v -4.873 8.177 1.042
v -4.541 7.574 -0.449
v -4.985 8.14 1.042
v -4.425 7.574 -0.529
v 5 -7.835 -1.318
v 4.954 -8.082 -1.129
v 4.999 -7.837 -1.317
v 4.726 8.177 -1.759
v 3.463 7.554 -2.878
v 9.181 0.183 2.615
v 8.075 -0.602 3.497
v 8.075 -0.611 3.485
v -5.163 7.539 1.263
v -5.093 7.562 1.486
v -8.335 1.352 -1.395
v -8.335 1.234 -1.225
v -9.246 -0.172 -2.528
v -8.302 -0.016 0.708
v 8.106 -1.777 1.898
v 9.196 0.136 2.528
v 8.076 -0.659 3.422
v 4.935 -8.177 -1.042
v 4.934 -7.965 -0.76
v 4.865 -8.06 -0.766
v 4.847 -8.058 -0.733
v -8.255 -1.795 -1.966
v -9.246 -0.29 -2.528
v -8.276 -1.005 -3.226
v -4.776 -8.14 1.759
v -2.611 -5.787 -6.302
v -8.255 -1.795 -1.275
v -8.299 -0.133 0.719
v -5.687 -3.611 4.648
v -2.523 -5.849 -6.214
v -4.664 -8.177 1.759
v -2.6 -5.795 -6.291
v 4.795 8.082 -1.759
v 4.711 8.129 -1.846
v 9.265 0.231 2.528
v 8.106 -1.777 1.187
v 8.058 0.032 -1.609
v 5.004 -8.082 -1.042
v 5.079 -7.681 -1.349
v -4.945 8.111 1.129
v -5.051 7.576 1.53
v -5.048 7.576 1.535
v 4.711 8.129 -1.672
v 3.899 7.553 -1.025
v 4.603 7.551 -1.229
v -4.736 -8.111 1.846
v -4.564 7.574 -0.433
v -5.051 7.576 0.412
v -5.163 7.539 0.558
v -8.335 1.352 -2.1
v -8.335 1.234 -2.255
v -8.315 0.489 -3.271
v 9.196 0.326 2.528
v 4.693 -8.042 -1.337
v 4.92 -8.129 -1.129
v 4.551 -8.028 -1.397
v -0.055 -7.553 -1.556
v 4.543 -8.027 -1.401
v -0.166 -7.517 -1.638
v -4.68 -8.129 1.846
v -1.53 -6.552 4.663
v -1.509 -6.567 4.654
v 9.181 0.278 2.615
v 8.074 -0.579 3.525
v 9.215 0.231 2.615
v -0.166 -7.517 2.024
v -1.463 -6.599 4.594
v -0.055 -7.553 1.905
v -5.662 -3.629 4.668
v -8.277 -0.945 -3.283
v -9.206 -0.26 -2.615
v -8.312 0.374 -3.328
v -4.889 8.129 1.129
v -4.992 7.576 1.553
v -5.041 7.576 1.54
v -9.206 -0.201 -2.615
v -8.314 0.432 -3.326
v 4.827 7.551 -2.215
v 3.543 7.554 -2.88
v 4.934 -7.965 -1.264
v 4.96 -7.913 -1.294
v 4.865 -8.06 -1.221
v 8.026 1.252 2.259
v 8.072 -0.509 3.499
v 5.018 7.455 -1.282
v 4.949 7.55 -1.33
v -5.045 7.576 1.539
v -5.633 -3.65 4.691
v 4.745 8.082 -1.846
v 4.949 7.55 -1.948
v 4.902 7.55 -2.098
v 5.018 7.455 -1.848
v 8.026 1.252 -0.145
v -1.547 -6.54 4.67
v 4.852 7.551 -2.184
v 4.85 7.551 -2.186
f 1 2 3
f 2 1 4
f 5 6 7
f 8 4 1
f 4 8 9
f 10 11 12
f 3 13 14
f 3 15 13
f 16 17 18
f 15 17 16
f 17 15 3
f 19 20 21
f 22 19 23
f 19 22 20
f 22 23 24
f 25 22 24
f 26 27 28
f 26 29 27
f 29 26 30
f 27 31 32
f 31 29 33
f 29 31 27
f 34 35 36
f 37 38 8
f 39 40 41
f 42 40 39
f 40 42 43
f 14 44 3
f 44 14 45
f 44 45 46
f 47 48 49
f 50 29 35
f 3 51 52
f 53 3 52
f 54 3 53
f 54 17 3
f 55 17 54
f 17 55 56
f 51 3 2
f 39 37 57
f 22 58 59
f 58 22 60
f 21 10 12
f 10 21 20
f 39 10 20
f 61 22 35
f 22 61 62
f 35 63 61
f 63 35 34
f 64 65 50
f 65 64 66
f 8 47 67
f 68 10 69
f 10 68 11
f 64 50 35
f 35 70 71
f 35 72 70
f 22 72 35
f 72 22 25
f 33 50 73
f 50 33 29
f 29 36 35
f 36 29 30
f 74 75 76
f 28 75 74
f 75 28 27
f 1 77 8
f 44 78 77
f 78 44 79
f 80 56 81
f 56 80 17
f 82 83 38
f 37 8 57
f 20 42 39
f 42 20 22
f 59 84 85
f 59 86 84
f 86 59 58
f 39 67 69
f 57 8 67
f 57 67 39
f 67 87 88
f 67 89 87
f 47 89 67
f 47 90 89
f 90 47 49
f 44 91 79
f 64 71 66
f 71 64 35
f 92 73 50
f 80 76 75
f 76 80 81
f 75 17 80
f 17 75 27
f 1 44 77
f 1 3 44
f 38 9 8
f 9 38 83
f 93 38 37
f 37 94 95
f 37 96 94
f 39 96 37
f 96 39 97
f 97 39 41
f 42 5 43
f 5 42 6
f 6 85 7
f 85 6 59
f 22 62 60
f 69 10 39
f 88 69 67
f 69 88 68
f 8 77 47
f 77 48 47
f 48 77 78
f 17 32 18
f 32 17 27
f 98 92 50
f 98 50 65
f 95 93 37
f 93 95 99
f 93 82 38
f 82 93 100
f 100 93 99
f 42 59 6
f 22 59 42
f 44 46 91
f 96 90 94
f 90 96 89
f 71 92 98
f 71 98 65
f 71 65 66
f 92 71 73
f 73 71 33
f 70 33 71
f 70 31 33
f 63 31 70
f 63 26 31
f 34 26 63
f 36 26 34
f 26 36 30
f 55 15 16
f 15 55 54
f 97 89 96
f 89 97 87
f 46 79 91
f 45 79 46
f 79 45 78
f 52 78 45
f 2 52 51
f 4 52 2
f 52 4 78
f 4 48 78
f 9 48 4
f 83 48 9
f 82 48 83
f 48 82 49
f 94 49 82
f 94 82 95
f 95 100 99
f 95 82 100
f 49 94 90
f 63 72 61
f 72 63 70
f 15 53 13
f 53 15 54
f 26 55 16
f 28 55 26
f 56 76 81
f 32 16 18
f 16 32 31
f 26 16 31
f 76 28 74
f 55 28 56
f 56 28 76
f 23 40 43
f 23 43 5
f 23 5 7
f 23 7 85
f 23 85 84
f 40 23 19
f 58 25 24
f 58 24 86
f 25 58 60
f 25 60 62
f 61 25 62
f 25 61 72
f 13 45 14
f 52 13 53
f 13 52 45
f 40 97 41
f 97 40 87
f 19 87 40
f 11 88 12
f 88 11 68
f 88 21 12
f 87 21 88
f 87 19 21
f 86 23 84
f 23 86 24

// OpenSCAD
// Auto-generated OpenSCAD file

    inner_points = 10*[[0.48336147006620667, -0.796491443485512, 0.24961052401954548], [-0.0033636129242731877, 0.20724337779290775, -0.9224172448029275], [-0.02146243534842994, -0.25567359892911584, 0.9224172448029275], [-0.5081875183389098, 0.7480612223493041, -0.24961052401954548], [0.8005548202773529, -0.17771619883438955, -0.46907269909671206], [-0.008558631255711907, -0.7457756765165251, -0.6195514429901602], [-0.01626741701699122, 0.6973454553803171, 0.6195514429901602], [-0.8253808685500561, 0.12928597769818145, 0.46907269909671206], [0.7925798307638832, 0.1251835430715676, 0.4839163595474912], [0.49176718629865324, 0.7455257783134321, -0.24043663734350143], [-0.8174058790365863, -0.1736137642077757, -0.4839163595474912]];

    outer_points = 10*[[0.46952448230116467, 0.8081551775499222, -0.1758990241773695], [0.49043976285885654, -0.8081551775499222, -0.10422353473988513], [-0.49043976285885654, 0.8081551775499222, 0.10422353473988513], [-0.46952448230116467, -0.8081551775499222, 0.1758990241773695], [0.6367153111321443, -0.02307267632934869, -0.7060947254896978], [0.9165394655214069, 0.02307267632934869, 0.2528469041459849], [-0.9165394655214069, -0.02307267632934869, -0.2528469041459849], [-0.6367153111321443, 0.02307267632934869, 0.7060947254896978], [-0.23284567347195917, 0.4621349933977465, -0.7979490193051987], [-0.2199193192030657, -0.5367997424223692, -0.7536511306725492], [0.23284567347195917, -0.4621349933977465, 0.7979490193051987]];

    // Convex hull for inner set (I)
    module inner_hull() {
        hull() {
            for (p = inner_points) {
                translate(p) sphere(r=0.1);
            }
        }
    }

    // Convex hull for outer set (O) minus inner hull (O \ I)
    module outer_minus_inner() {
        difference() {
            hull() {
                for (p = outer_points) {
                    translate(p) sphere(r=0.1);
                }
            }
            inner_hull(); // Subtract inner hull
        }
    }

    // Convex hull for outer set (O) minus all translated inner hulls
    module outer_minus_AllTranslationInner() {
        difference() {
            hull() {
                for (p = outer_points) {
                    translate(p) sphere(r=0.1);
                }
            }
            hull() {
                translate([0,0,50]) inner_hull();
                translate([0,0,-50]) inner_hull();
            }; // Subtract translated inner hulls
        }
    }

    // Difference between outer_minus_inner and outer_minus_AllTranslationInner
    module outer_minus_inner_diff() {
        difference() {
            // Outer minus inner
            difference() {
                hull() {
                    for (p = outer_points) {
                        translate(p) sphere(r=0.1);
                    }
                }
                inner_hull();
            }

            // Subtract Outer minus AllTranslationInner
            difference() {
                hull() {
                    for (p = outer_points) {
                        translate(p) sphere(r=0.1);
                    }
                }
                hull() {
                    translate([0,0,50]) inner_hull();
                    translate([0,0,-50]) inner_hull();
                };
            }
        }
    }

    // Rendering all with colors applied
    color([0, 1, 0, 1]) outer_minus_AllTranslationInner(); // Opaque green
    
